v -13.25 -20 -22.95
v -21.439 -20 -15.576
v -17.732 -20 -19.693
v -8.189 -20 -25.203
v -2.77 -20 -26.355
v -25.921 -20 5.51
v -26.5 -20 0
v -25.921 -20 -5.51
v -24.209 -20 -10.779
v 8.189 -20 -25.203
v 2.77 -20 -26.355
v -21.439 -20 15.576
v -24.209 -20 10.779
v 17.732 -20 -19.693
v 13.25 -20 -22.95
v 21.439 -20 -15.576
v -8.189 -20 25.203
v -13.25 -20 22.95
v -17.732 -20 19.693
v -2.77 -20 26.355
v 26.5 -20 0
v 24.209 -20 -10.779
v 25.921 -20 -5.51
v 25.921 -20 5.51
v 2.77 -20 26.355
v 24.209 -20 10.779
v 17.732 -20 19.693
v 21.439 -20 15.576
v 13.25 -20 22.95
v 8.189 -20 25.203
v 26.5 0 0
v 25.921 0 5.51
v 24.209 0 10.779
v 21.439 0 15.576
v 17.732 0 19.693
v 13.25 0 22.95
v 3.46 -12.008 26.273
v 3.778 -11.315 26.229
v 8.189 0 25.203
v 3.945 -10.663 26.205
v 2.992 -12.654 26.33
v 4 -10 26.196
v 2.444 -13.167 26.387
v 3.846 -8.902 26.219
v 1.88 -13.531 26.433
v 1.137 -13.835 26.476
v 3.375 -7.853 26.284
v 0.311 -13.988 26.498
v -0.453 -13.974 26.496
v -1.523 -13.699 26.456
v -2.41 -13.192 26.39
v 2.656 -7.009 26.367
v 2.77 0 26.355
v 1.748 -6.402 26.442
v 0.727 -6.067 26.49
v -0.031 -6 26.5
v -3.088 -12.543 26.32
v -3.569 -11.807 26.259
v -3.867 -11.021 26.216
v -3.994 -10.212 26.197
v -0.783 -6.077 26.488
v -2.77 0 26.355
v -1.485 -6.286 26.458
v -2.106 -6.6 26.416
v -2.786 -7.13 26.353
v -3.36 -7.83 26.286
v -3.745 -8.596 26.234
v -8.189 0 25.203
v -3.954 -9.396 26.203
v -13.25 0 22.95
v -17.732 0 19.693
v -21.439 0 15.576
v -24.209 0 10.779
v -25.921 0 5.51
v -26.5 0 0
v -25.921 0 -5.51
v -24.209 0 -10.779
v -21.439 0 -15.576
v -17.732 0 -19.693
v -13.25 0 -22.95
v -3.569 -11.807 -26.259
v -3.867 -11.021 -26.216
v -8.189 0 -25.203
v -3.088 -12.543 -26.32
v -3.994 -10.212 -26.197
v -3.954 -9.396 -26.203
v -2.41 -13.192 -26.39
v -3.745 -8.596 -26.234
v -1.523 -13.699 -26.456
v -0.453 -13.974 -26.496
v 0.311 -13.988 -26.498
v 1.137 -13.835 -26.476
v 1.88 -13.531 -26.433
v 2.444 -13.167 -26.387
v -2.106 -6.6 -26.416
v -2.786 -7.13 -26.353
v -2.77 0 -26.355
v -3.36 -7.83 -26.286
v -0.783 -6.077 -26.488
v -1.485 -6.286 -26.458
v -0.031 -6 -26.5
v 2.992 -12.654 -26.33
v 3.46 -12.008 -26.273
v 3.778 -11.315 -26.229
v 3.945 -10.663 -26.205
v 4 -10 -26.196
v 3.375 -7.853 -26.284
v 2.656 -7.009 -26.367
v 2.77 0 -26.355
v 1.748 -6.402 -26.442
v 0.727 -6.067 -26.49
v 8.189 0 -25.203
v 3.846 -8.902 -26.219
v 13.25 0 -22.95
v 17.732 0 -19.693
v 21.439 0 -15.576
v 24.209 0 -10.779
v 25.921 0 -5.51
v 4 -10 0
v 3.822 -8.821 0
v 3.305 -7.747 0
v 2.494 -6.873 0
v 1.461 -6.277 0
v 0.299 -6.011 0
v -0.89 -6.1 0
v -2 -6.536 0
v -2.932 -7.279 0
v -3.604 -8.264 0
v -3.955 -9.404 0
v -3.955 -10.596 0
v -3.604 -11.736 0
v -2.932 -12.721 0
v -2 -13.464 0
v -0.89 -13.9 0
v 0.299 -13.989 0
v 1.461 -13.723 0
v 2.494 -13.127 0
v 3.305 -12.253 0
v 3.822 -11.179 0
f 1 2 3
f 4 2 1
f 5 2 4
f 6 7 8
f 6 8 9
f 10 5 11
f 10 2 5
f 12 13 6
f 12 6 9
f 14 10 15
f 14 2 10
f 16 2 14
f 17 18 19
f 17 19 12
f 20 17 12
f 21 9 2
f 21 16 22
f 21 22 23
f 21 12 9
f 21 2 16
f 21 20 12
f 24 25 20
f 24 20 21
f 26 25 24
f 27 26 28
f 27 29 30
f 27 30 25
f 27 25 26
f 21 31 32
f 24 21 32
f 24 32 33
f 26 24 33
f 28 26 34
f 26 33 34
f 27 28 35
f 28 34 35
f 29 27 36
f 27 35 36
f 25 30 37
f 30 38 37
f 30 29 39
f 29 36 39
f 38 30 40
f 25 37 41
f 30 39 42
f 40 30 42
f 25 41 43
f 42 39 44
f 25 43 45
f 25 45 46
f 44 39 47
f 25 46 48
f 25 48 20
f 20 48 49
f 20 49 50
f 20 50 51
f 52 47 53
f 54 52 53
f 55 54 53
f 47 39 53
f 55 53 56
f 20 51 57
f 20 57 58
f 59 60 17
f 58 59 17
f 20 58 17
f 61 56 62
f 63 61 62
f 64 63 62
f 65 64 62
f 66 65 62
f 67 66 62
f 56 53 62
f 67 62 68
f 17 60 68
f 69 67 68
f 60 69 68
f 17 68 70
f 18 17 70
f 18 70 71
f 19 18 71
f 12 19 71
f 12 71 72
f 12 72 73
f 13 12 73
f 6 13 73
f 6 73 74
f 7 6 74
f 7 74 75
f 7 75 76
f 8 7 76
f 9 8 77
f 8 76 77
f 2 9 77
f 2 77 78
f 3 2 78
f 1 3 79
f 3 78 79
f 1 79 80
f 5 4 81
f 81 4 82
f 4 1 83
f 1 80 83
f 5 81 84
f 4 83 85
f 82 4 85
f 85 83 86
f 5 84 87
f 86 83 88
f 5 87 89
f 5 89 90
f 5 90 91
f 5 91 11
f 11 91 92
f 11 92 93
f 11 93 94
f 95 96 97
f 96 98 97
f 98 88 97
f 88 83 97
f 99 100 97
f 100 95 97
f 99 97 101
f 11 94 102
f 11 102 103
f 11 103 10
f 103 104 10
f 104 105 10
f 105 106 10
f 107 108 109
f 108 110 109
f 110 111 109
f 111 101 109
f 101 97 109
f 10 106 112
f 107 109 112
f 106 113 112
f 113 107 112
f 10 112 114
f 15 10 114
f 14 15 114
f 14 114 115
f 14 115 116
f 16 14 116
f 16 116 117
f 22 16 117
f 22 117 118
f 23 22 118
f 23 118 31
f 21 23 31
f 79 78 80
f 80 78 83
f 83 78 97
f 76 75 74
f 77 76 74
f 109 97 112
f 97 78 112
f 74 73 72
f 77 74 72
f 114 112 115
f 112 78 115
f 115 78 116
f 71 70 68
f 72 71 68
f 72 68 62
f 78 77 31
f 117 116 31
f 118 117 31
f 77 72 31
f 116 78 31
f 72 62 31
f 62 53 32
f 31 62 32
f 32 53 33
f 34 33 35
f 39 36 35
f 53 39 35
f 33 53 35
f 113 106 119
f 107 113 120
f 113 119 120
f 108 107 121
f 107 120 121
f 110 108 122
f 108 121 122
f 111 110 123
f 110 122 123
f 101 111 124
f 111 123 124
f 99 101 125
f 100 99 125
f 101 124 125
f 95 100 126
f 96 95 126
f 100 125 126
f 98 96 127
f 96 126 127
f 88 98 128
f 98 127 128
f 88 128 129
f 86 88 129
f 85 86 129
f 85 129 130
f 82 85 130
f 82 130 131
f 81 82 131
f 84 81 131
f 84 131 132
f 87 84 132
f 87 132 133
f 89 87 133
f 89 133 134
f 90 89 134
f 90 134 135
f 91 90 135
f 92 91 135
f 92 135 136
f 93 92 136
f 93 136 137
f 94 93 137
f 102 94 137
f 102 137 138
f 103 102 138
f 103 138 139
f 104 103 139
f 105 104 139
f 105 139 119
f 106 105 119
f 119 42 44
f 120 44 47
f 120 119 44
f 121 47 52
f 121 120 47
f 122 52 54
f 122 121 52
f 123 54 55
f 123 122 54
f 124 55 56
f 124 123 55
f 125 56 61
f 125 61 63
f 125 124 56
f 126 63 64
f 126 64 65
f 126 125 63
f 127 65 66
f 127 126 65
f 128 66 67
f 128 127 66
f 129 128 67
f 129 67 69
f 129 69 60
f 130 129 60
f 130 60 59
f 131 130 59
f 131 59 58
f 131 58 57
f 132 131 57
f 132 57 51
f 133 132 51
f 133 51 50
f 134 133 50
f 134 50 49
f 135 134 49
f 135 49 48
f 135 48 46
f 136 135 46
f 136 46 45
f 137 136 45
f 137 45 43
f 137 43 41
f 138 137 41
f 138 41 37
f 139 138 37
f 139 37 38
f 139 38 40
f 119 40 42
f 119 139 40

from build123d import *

# Parameters (mm, degrees)
F0_R     = 26.5
F1_DEPTH = 20
F2_R     = 4
F3_DEPTH = 26.501
F4_DEPTH = 26.501


with BuildPart() as f1:
    # F0 (on Front) → F1 (new body)
    with BuildSketch(Plane.XZ):
        Circle(F0_R)
    extrude(amount=F1_DEPTH)

    # F2 (on Top) → F3 (cut, through all)
    with BuildSketch(Plane.XY):
        with Locations((0, -10)):
            Circle(F2_R)
    extrude(amount=-F3_DEPTH, mode=Mode.SUBTRACT)

    # F2 (on Top) → F4 (cut, through all)
    with BuildSketch(Plane.XY):
        with Locations((0, -10)):
            Circle(F2_R)
    extrude(amount=F4_DEPTH, mode=Mode.SUBTRACT)


solid = f1.part
